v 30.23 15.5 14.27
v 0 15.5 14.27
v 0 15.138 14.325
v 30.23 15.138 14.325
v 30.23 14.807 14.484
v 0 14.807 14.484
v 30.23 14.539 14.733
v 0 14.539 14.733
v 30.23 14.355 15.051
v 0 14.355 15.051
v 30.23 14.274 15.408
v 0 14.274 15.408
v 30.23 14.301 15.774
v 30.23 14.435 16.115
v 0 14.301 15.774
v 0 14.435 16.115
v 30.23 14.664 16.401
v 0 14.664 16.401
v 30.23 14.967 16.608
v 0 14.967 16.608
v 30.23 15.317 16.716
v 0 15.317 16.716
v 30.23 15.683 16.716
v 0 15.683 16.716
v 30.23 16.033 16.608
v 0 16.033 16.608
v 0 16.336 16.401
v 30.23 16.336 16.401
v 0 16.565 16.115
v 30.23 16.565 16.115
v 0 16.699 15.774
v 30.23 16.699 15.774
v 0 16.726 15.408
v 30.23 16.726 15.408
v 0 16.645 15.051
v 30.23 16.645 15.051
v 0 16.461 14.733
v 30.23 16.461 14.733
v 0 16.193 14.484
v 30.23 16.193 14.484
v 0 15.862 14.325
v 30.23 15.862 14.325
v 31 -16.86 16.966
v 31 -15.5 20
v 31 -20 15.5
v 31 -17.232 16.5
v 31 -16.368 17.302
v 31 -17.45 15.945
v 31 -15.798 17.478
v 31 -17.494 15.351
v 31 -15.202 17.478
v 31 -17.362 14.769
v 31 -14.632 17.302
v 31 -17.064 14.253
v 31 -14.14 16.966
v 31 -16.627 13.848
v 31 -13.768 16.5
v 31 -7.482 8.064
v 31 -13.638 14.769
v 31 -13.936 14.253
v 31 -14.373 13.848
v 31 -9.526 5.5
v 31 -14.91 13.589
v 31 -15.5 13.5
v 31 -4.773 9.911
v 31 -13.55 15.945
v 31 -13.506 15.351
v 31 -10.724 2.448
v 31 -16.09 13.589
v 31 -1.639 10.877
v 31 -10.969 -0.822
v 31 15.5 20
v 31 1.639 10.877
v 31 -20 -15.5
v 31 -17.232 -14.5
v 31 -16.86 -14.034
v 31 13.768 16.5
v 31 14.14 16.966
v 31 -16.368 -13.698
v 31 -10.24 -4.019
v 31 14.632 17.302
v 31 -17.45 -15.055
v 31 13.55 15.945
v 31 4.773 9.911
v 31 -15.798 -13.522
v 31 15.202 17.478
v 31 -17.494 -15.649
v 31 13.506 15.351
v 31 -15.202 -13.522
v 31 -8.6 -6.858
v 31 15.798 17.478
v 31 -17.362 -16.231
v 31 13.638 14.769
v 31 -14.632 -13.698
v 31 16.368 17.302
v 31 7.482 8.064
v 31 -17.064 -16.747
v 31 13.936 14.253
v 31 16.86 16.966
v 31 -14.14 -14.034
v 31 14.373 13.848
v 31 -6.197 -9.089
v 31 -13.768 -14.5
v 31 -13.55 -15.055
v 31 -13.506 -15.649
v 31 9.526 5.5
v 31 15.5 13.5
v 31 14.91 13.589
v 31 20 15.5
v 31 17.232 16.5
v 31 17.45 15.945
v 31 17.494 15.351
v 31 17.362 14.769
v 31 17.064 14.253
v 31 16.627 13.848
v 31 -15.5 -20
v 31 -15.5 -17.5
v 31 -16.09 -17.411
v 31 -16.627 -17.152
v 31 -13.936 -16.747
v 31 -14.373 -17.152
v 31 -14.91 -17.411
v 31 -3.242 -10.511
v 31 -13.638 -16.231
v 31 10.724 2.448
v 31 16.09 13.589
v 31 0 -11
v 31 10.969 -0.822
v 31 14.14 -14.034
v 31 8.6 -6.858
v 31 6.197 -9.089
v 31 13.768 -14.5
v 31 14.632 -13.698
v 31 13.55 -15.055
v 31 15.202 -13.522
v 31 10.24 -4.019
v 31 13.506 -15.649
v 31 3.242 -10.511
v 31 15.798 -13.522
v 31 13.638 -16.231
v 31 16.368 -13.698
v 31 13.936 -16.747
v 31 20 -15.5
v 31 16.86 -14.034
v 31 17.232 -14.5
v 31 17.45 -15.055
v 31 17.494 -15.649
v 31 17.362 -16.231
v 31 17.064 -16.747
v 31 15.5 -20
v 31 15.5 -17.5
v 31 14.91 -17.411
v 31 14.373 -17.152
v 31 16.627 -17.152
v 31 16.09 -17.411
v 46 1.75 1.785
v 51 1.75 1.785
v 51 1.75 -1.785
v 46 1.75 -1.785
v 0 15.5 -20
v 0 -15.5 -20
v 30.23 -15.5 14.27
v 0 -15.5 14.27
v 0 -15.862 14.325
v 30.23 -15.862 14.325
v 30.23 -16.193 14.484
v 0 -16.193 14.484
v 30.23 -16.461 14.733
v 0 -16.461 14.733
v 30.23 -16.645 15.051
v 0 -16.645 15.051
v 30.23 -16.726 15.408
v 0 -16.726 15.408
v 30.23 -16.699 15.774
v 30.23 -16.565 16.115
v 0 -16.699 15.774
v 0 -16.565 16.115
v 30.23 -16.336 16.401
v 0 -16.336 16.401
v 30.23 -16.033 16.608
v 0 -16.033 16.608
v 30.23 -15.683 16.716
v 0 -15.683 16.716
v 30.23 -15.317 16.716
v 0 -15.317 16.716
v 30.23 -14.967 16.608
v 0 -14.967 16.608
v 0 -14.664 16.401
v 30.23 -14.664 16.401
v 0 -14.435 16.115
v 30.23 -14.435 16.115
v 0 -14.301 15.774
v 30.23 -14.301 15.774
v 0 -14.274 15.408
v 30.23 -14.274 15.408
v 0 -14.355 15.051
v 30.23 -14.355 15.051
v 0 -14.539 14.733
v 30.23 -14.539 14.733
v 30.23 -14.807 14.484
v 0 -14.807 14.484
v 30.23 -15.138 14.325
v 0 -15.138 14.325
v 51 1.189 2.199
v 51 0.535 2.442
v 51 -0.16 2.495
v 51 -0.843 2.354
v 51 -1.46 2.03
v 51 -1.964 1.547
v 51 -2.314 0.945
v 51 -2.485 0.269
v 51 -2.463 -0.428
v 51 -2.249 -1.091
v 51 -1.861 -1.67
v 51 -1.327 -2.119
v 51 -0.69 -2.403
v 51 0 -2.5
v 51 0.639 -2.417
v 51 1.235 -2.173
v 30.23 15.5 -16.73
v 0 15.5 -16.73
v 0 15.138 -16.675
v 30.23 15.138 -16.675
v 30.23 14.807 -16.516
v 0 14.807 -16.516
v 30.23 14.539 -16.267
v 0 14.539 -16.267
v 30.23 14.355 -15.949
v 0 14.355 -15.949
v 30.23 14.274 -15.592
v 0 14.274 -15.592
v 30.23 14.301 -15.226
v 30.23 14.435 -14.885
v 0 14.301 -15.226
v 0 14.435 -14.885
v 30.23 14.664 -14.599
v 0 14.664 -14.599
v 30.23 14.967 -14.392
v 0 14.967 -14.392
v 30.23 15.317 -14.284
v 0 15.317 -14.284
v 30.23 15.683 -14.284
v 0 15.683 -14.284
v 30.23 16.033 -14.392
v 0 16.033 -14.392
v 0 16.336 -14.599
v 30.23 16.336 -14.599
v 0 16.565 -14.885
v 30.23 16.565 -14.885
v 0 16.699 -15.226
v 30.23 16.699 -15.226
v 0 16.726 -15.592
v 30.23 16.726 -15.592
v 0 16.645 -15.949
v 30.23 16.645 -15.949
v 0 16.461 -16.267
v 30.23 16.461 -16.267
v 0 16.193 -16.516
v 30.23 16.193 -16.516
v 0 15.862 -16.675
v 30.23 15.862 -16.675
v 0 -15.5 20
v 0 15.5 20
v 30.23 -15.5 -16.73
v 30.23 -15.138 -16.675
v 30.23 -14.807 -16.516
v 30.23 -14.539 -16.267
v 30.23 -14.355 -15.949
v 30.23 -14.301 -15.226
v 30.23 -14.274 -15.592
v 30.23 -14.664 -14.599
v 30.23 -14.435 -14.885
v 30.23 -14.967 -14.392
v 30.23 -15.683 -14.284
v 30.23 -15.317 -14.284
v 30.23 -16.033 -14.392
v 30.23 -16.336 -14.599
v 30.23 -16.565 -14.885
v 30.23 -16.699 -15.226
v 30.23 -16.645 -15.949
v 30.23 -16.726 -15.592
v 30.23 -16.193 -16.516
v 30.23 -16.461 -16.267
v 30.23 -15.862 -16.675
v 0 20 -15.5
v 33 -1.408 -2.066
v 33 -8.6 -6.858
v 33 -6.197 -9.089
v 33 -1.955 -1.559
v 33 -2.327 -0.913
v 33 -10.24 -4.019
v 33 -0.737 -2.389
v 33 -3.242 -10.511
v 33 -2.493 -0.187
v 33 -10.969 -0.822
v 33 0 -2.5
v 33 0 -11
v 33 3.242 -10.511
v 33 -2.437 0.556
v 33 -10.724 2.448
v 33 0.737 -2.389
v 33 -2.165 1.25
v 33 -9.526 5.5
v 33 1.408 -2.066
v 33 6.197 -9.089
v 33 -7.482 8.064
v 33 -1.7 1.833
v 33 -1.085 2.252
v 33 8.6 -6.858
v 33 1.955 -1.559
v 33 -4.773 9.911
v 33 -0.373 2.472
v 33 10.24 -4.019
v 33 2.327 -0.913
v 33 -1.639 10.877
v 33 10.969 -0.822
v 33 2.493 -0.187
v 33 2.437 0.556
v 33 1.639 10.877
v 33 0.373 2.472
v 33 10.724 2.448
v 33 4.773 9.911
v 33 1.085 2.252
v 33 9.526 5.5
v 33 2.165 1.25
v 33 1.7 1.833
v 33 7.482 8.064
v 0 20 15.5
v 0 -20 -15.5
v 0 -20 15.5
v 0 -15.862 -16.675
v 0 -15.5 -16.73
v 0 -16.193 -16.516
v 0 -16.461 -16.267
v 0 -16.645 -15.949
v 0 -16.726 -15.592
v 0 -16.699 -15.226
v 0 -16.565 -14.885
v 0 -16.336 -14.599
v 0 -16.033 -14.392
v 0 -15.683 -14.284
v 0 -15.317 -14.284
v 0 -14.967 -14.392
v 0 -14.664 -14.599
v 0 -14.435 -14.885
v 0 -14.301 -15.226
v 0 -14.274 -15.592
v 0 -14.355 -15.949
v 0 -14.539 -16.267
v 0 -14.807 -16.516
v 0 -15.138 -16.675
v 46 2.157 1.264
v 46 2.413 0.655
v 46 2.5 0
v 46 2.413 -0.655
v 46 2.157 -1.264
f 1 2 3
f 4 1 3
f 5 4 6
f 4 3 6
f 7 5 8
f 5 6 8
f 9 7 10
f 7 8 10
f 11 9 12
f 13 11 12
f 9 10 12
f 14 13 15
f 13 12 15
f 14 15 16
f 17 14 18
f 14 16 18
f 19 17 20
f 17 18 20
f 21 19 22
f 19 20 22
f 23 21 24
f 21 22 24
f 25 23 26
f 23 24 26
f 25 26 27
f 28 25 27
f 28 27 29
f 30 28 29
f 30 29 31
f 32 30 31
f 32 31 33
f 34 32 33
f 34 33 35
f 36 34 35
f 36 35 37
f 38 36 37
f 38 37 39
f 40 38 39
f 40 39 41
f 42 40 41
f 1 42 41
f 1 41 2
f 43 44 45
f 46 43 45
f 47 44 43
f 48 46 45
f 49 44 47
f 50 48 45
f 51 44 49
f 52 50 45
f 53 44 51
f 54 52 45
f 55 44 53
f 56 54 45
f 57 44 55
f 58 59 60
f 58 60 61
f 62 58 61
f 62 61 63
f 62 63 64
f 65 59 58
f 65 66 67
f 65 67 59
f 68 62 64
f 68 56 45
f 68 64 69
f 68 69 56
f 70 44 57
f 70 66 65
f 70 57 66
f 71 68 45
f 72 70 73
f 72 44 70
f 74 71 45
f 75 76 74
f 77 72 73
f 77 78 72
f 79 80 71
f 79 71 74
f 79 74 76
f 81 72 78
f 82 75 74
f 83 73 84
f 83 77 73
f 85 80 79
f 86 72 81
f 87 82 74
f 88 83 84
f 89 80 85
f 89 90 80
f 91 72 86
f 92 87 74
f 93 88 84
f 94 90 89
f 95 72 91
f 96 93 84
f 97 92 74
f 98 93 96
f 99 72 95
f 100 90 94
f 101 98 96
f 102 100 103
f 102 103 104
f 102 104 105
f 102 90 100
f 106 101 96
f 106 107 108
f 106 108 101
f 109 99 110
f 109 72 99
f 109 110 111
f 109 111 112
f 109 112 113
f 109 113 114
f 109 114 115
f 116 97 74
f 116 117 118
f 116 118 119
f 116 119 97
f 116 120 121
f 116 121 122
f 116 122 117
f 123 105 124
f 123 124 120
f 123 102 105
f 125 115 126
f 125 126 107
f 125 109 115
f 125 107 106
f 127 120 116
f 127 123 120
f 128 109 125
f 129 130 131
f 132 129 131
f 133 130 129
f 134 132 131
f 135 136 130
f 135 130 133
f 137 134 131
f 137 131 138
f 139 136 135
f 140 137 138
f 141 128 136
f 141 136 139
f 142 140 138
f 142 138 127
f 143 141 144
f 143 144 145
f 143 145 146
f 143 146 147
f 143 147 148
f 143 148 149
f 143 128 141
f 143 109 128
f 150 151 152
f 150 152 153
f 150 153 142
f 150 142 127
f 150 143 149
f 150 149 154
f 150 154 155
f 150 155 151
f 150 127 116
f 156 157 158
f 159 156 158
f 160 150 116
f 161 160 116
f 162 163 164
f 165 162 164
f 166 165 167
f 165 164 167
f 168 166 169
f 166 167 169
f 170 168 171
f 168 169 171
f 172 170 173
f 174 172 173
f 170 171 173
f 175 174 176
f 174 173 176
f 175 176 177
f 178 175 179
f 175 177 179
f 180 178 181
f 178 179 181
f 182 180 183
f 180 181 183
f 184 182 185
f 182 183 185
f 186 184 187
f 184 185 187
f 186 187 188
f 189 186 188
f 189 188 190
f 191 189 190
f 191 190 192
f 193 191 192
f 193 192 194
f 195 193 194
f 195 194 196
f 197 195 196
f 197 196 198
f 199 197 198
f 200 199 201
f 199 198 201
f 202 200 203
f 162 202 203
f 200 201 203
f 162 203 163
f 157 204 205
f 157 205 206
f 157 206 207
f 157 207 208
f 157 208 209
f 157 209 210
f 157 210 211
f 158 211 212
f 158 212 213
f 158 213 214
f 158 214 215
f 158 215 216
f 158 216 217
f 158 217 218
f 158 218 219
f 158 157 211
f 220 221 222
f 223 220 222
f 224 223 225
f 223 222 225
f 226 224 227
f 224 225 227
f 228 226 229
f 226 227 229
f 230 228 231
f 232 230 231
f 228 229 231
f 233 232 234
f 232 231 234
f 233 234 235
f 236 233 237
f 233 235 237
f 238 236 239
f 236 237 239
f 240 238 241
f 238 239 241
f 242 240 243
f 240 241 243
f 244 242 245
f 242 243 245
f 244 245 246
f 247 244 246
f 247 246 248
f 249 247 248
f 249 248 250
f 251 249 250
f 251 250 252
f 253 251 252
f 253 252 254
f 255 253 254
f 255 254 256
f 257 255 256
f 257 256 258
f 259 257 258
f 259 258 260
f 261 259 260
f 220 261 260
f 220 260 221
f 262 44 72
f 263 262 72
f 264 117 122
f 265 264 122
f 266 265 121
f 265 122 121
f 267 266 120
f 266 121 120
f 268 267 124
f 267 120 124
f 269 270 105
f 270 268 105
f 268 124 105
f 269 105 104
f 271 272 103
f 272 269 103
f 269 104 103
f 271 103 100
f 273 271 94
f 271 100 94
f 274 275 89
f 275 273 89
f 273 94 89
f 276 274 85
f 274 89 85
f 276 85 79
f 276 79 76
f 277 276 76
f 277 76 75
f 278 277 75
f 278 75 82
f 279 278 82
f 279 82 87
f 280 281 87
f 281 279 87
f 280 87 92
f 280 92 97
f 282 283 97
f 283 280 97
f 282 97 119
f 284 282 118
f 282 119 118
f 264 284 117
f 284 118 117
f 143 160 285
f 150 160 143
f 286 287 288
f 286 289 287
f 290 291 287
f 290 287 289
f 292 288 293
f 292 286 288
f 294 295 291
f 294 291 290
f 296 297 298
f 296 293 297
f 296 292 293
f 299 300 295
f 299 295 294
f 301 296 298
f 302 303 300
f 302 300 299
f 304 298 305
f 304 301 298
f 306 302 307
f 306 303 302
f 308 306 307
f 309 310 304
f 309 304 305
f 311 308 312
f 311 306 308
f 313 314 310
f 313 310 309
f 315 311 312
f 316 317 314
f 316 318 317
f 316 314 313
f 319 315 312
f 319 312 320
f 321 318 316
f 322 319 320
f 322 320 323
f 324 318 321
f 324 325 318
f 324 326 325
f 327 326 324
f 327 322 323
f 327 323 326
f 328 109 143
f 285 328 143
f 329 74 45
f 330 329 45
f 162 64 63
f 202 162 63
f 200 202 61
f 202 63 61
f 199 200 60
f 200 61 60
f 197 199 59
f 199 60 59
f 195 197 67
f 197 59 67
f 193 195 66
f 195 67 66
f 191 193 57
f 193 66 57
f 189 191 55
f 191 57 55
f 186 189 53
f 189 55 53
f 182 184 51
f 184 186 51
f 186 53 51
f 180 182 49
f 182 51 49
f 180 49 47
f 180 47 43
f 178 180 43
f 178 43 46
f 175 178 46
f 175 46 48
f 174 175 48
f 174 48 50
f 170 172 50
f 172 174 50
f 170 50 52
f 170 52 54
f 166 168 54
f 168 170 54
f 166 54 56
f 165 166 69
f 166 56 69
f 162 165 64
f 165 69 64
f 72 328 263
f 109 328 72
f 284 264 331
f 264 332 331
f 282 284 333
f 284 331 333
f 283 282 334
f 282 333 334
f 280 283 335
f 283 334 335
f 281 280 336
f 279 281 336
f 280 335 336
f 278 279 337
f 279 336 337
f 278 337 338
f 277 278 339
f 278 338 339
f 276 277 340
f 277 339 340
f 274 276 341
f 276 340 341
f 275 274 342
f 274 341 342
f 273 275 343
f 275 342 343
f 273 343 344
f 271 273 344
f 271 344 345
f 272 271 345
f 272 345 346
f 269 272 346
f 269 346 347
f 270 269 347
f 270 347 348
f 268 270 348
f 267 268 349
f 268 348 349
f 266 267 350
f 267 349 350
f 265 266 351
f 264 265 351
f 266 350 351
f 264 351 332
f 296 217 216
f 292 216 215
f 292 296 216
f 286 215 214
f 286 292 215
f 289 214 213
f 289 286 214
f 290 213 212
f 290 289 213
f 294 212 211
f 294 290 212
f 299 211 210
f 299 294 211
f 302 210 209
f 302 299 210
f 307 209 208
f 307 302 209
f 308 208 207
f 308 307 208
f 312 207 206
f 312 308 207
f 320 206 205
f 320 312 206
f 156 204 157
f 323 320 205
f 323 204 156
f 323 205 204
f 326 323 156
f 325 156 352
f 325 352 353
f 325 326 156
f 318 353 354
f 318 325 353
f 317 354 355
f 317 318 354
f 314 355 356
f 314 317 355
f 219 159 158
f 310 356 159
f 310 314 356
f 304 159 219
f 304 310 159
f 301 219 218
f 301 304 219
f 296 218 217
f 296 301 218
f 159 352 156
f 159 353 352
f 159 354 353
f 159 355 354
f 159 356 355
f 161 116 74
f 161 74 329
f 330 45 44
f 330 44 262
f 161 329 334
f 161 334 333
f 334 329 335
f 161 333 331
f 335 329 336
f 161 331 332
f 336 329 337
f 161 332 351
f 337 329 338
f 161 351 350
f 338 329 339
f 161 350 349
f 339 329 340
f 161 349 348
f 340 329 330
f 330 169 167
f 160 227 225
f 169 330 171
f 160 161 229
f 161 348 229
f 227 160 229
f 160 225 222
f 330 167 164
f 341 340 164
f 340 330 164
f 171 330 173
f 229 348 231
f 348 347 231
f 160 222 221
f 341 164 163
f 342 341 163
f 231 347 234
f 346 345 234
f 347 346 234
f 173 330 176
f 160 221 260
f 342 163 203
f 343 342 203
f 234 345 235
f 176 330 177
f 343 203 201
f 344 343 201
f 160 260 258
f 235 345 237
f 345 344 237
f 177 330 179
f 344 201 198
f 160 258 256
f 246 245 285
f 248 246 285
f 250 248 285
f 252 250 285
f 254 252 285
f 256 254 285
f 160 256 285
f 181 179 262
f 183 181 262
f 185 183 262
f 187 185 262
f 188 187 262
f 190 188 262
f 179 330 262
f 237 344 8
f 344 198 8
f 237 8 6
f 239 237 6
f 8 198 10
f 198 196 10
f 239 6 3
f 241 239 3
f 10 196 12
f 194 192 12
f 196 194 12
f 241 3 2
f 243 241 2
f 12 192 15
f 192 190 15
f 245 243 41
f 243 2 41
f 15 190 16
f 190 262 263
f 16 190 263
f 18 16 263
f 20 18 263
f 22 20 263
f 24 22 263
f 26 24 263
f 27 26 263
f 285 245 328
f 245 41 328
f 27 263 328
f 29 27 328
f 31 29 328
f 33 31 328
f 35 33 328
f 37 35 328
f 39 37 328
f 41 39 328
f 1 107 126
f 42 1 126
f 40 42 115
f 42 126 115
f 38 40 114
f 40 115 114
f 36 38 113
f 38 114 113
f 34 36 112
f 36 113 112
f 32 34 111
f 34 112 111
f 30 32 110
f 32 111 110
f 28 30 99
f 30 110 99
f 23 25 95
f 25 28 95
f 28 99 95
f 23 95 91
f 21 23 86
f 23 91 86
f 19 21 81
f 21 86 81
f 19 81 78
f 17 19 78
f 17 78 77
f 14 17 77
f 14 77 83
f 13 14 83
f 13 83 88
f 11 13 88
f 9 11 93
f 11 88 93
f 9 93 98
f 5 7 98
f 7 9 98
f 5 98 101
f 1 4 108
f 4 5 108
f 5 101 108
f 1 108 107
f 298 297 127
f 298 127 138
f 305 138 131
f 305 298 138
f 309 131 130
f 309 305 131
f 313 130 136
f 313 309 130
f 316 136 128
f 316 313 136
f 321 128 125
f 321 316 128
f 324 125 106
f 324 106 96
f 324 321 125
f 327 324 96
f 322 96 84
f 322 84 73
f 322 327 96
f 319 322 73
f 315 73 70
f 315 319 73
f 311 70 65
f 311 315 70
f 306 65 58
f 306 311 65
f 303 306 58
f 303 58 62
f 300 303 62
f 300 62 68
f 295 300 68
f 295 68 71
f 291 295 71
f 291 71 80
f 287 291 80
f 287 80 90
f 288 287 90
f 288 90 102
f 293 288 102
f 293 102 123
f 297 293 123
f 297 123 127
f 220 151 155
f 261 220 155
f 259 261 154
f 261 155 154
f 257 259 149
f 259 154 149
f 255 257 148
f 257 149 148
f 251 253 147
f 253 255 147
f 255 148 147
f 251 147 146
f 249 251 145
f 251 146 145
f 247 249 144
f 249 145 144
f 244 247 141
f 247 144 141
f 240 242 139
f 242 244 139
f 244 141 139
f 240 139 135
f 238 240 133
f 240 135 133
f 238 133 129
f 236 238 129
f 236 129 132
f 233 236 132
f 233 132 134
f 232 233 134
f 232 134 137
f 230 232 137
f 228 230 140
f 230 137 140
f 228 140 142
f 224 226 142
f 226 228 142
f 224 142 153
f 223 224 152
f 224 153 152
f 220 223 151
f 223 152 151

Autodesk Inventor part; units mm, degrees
ref_plane "YZ Plane" through (0, 0, 0) normal (1, 0, 0) x (0, 1, 0)
ref_plane "XZ Plane" through (0, 0, 0) normal (0, 1, 0) x (-1, 0, 0)
ref_plane "XY Plane" through (0, 0, 0) normal (0, 0, 1) x (1, 0, 0)
sketch "Sketch1" plane through (0, 0, 0) normal (1, 0, 0) x (0, 1, 0)
  line L0 (-20, 20) -> (20, 20)
  line L1 (20, 20) -> (20, -20)
  line L2 (20, -20) -> (-20, -20)
  line L3 (-20, -20) -> (-20, 20)
  line L4 (-20, 20) -> (20, -20) construction
  line L5 (20, 20) -> (-20, -20) construction
  point P0 (0, 0)
  point P1 (0, 0)
  dimension "d0" = 40
  dimension "d1" = 40
extrude "Extrusion1" add sketch "Sketch1" along normal blind 33
sketch "Sketch2" plane through (33, 0, 0) normal (1, 0, 0) x (0, 0, -1)
  line L0 (-20, 20) -> (-20, -20) projected
  line L1 (-20, -20) -> (20, -20) projected
  line L2 (20, -20) -> (20, 20) projected
  line L3 (20, 20) -> (-20, 20) projected
  circle A0 centre (0, 0) radius 11
  dimension "d4" = 22
extrude "Extrusion2" cut sketch "Sketch2" against normal blind 2
sketch "Sketch3" plane through (33, 0, 0) normal (1, 0, 0) x (0, 0, -1)
  circle A0 centre (0, 0) radius 2.5
  dimension "d7" = 5
extrude "Extrusion3" add sketch "Sketch3" along normal blind 18
sketch "Sketch4" plane through (31, 0, 0) normal (1, 0, 0) x (0, 0, -1)
  line L0 (20, 20) -> (20, -20) projected
  line L1 (-20, 20) -> (20, 20) projected
  point P0 (15.5, 15.5)
  point P1 (-15.5, 15.5)
  point P2 (15.5, -15.5)
  point P3 (-15.5, -15.5)
  dimension "d12" = 31
  dimension "d15" = 31
hole "Hole1" at (31, 15.5, -15.5) at (31, 15.5, 15.5) at (31, -15.5, -15.5) at (31, -15.5, 15.5) direction (-1, 0, 0) diameter 2.459 end through all countersink diameter 4 countersink angle 90 thread size "M3x0.5" class "6H" standard "ANSI Metric M Profile"
chamfer "Chamfer1" distance 4.5 angle 45 4 edges at (15.5, 20, -20) (15.5, -20, -20) (15.5, 20, 20) (15.5, -20, 20)
sketch "Sketch7" plane through (51, 0, 0) normal (1, 0, 0) x (0, 0, -1)
  line L0 (-2.5, 1.7499) -> (2.5, 1.7499)
  line L1 (2.5, 1.7499) -> (2.5, 3.2499)
  line L2 (2.5, 3.2499) -> (-2.5, 3.2499)
  line L3 (-2.5, 3.2499) -> (-2.5, 1.7499)
  line L4 (-2.5, 1.7499) -> (2.5, 3.2499) construction
  line L5 (2.5, 1.7499) -> (-2.5, 3.2499) construction
  point P0 (0, 2.4999)
  dimension "d29" = 5
  dimension "d30" = 1.5
extrude "Extrusion4" cut sketch "Sketch7" against normal blind 5
properties part number "Stepper_Motor"
